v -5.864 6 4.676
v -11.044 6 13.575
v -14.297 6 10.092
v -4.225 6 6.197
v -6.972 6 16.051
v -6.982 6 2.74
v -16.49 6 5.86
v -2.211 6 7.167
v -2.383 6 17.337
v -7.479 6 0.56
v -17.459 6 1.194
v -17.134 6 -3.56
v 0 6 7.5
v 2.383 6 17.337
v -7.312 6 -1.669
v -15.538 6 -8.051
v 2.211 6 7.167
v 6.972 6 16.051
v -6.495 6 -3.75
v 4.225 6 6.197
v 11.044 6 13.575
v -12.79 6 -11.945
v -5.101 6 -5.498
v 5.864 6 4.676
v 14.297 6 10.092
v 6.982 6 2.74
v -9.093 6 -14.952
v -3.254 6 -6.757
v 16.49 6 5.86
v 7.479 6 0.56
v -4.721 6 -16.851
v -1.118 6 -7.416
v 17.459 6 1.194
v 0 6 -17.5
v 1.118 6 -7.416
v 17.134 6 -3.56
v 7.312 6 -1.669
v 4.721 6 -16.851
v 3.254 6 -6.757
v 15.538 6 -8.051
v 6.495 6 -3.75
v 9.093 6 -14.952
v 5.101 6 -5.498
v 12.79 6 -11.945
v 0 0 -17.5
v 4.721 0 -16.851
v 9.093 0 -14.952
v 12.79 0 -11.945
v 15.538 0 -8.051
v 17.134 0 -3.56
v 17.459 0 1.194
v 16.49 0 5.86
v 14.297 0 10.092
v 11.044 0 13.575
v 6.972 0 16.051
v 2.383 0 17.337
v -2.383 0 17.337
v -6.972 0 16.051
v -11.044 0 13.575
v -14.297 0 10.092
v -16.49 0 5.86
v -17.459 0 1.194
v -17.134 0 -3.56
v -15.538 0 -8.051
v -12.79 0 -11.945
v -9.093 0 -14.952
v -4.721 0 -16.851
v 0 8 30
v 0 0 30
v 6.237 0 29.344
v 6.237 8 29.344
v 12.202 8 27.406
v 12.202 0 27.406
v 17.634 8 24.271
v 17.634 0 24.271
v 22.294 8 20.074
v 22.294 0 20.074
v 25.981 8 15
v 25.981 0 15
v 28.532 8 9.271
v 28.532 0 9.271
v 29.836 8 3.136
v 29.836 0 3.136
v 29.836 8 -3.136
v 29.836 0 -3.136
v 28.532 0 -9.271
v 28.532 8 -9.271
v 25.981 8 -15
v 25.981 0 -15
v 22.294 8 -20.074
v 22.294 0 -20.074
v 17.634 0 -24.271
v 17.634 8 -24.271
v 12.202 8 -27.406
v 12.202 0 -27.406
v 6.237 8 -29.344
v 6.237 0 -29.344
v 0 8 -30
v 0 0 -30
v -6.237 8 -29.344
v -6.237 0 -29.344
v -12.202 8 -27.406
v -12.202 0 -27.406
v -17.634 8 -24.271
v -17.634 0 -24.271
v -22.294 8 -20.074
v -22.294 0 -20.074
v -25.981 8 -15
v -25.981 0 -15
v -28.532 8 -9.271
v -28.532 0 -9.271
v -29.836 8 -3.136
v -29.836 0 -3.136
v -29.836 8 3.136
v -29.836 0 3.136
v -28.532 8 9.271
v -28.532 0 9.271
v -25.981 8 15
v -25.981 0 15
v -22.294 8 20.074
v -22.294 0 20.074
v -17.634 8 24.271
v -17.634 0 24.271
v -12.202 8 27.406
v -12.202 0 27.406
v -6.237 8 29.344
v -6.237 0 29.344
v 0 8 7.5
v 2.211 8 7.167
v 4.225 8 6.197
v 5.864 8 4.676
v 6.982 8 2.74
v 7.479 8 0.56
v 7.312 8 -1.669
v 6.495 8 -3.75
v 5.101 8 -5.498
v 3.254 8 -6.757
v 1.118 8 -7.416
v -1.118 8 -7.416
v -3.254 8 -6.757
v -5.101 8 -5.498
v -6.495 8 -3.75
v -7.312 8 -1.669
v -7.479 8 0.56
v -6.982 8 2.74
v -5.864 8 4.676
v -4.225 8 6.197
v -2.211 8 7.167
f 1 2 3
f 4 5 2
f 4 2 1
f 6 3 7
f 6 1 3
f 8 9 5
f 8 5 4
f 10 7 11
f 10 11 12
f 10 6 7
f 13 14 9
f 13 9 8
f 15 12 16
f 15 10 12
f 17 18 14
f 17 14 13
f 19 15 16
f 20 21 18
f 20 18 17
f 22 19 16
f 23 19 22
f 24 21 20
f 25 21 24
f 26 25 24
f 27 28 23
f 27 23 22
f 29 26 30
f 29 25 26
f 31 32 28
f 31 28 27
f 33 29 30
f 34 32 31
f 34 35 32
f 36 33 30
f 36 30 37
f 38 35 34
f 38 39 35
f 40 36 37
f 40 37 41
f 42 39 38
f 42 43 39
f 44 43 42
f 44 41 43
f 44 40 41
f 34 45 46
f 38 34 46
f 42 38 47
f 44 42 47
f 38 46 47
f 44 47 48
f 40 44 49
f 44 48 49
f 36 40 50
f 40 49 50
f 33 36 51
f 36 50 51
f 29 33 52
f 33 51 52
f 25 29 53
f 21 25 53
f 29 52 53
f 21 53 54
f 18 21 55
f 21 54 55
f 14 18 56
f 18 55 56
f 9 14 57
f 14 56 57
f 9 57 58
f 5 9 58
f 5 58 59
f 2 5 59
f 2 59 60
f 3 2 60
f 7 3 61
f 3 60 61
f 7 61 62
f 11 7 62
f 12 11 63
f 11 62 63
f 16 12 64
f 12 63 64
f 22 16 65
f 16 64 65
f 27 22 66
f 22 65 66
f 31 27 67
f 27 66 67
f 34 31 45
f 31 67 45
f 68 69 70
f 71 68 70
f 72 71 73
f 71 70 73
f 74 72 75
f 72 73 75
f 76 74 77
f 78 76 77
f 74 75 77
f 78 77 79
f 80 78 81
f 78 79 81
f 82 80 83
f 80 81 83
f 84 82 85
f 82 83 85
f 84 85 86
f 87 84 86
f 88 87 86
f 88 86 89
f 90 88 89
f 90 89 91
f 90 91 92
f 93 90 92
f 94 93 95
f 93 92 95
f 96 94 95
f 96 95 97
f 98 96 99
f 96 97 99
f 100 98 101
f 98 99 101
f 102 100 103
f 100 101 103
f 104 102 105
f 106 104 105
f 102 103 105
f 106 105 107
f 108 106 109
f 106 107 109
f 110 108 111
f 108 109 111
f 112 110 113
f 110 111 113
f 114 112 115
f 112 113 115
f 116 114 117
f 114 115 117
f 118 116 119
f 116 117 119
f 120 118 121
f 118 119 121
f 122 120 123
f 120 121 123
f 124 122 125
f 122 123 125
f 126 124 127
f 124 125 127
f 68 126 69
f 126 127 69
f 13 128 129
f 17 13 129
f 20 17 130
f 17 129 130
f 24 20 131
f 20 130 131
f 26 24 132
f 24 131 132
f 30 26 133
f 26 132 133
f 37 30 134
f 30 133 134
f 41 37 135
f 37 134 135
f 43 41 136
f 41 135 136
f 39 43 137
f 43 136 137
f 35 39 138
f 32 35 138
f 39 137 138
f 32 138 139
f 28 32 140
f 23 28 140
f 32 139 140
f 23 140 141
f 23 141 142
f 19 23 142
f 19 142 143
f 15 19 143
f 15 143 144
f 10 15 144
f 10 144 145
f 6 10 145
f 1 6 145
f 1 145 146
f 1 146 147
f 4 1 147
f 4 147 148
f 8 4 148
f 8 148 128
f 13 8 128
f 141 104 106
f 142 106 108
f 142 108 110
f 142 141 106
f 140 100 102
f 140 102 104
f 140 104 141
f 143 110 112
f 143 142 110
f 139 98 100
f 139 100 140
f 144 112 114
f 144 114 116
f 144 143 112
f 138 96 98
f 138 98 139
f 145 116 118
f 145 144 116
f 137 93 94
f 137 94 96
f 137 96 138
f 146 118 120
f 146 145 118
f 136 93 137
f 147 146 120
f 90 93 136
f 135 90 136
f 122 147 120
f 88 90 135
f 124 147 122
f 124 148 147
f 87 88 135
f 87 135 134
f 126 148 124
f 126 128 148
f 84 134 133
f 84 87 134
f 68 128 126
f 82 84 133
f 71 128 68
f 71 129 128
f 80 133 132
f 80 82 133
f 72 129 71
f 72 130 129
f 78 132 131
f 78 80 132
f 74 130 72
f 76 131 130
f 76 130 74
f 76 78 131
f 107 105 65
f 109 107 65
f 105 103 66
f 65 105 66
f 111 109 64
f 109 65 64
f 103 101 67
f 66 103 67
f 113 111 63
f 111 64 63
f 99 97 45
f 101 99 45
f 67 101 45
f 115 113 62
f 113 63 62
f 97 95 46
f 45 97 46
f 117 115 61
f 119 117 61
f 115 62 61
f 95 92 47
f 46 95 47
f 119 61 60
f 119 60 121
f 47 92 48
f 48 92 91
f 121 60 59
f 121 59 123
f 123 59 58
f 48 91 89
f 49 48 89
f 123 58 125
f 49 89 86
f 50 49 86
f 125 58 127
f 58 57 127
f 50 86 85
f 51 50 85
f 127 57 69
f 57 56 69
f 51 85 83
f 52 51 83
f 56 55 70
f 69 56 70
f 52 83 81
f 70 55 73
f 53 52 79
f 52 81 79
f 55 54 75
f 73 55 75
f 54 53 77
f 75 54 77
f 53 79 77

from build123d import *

# Parameters (mm, degrees)
ESQUISSE1_R             = 30
BOSS_EXTRU_1_DEPTH      = 8
ESQUISSE2_R             = 17.5
ENL_V_MAT_EXTRU_1_DEPTH = 6
ESQUISSE3_R             = 7.5
ENL_V_MAT_EXTRU_2_DEPTH = 44.17406629


with BuildPart() as part:
    # Esquisse1 → Boss.-Extru.1 (new body)
    with BuildSketch(Plane(origin=(0, 0, 0), x_dir=(1, 0, 0), z_dir=(0, 1, 0))):
        with Locations(Location((0, 0, 0), (0, 0, 270))):
            Circle(ESQUISSE1_R)
    extrude(amount=BOSS_EXTRU_1_DEPTH)

    # Esquisse2 → Enlèv. mat.-Extru.1 (cut)
    with BuildSketch(Plane.XZ):
        with Locations(Location((0, 0, 0), (0, 0, 270))):
            Circle(ESQUISSE2_R)
    extrude(amount=-ENL_V_MAT_EXTRU_1_DEPTH, mode=Mode.SUBTRACT)

    # Esquisse3 → Enlèv. mat.-Extru.2 (cut, through all)
    with BuildSketch(Plane(origin=(0, 8, 0), x_dir=(1, 0, 0), z_dir=(0, 1, 0))):
        with Locations(Location((0, 0, 0), (0, 0, 270))):
            Circle(ESQUISSE3_R)
    extrude(amount=-ENL_V_MAT_EXTRU_2_DEPTH, mode=Mode.SUBTRACT)


solid = part.part
